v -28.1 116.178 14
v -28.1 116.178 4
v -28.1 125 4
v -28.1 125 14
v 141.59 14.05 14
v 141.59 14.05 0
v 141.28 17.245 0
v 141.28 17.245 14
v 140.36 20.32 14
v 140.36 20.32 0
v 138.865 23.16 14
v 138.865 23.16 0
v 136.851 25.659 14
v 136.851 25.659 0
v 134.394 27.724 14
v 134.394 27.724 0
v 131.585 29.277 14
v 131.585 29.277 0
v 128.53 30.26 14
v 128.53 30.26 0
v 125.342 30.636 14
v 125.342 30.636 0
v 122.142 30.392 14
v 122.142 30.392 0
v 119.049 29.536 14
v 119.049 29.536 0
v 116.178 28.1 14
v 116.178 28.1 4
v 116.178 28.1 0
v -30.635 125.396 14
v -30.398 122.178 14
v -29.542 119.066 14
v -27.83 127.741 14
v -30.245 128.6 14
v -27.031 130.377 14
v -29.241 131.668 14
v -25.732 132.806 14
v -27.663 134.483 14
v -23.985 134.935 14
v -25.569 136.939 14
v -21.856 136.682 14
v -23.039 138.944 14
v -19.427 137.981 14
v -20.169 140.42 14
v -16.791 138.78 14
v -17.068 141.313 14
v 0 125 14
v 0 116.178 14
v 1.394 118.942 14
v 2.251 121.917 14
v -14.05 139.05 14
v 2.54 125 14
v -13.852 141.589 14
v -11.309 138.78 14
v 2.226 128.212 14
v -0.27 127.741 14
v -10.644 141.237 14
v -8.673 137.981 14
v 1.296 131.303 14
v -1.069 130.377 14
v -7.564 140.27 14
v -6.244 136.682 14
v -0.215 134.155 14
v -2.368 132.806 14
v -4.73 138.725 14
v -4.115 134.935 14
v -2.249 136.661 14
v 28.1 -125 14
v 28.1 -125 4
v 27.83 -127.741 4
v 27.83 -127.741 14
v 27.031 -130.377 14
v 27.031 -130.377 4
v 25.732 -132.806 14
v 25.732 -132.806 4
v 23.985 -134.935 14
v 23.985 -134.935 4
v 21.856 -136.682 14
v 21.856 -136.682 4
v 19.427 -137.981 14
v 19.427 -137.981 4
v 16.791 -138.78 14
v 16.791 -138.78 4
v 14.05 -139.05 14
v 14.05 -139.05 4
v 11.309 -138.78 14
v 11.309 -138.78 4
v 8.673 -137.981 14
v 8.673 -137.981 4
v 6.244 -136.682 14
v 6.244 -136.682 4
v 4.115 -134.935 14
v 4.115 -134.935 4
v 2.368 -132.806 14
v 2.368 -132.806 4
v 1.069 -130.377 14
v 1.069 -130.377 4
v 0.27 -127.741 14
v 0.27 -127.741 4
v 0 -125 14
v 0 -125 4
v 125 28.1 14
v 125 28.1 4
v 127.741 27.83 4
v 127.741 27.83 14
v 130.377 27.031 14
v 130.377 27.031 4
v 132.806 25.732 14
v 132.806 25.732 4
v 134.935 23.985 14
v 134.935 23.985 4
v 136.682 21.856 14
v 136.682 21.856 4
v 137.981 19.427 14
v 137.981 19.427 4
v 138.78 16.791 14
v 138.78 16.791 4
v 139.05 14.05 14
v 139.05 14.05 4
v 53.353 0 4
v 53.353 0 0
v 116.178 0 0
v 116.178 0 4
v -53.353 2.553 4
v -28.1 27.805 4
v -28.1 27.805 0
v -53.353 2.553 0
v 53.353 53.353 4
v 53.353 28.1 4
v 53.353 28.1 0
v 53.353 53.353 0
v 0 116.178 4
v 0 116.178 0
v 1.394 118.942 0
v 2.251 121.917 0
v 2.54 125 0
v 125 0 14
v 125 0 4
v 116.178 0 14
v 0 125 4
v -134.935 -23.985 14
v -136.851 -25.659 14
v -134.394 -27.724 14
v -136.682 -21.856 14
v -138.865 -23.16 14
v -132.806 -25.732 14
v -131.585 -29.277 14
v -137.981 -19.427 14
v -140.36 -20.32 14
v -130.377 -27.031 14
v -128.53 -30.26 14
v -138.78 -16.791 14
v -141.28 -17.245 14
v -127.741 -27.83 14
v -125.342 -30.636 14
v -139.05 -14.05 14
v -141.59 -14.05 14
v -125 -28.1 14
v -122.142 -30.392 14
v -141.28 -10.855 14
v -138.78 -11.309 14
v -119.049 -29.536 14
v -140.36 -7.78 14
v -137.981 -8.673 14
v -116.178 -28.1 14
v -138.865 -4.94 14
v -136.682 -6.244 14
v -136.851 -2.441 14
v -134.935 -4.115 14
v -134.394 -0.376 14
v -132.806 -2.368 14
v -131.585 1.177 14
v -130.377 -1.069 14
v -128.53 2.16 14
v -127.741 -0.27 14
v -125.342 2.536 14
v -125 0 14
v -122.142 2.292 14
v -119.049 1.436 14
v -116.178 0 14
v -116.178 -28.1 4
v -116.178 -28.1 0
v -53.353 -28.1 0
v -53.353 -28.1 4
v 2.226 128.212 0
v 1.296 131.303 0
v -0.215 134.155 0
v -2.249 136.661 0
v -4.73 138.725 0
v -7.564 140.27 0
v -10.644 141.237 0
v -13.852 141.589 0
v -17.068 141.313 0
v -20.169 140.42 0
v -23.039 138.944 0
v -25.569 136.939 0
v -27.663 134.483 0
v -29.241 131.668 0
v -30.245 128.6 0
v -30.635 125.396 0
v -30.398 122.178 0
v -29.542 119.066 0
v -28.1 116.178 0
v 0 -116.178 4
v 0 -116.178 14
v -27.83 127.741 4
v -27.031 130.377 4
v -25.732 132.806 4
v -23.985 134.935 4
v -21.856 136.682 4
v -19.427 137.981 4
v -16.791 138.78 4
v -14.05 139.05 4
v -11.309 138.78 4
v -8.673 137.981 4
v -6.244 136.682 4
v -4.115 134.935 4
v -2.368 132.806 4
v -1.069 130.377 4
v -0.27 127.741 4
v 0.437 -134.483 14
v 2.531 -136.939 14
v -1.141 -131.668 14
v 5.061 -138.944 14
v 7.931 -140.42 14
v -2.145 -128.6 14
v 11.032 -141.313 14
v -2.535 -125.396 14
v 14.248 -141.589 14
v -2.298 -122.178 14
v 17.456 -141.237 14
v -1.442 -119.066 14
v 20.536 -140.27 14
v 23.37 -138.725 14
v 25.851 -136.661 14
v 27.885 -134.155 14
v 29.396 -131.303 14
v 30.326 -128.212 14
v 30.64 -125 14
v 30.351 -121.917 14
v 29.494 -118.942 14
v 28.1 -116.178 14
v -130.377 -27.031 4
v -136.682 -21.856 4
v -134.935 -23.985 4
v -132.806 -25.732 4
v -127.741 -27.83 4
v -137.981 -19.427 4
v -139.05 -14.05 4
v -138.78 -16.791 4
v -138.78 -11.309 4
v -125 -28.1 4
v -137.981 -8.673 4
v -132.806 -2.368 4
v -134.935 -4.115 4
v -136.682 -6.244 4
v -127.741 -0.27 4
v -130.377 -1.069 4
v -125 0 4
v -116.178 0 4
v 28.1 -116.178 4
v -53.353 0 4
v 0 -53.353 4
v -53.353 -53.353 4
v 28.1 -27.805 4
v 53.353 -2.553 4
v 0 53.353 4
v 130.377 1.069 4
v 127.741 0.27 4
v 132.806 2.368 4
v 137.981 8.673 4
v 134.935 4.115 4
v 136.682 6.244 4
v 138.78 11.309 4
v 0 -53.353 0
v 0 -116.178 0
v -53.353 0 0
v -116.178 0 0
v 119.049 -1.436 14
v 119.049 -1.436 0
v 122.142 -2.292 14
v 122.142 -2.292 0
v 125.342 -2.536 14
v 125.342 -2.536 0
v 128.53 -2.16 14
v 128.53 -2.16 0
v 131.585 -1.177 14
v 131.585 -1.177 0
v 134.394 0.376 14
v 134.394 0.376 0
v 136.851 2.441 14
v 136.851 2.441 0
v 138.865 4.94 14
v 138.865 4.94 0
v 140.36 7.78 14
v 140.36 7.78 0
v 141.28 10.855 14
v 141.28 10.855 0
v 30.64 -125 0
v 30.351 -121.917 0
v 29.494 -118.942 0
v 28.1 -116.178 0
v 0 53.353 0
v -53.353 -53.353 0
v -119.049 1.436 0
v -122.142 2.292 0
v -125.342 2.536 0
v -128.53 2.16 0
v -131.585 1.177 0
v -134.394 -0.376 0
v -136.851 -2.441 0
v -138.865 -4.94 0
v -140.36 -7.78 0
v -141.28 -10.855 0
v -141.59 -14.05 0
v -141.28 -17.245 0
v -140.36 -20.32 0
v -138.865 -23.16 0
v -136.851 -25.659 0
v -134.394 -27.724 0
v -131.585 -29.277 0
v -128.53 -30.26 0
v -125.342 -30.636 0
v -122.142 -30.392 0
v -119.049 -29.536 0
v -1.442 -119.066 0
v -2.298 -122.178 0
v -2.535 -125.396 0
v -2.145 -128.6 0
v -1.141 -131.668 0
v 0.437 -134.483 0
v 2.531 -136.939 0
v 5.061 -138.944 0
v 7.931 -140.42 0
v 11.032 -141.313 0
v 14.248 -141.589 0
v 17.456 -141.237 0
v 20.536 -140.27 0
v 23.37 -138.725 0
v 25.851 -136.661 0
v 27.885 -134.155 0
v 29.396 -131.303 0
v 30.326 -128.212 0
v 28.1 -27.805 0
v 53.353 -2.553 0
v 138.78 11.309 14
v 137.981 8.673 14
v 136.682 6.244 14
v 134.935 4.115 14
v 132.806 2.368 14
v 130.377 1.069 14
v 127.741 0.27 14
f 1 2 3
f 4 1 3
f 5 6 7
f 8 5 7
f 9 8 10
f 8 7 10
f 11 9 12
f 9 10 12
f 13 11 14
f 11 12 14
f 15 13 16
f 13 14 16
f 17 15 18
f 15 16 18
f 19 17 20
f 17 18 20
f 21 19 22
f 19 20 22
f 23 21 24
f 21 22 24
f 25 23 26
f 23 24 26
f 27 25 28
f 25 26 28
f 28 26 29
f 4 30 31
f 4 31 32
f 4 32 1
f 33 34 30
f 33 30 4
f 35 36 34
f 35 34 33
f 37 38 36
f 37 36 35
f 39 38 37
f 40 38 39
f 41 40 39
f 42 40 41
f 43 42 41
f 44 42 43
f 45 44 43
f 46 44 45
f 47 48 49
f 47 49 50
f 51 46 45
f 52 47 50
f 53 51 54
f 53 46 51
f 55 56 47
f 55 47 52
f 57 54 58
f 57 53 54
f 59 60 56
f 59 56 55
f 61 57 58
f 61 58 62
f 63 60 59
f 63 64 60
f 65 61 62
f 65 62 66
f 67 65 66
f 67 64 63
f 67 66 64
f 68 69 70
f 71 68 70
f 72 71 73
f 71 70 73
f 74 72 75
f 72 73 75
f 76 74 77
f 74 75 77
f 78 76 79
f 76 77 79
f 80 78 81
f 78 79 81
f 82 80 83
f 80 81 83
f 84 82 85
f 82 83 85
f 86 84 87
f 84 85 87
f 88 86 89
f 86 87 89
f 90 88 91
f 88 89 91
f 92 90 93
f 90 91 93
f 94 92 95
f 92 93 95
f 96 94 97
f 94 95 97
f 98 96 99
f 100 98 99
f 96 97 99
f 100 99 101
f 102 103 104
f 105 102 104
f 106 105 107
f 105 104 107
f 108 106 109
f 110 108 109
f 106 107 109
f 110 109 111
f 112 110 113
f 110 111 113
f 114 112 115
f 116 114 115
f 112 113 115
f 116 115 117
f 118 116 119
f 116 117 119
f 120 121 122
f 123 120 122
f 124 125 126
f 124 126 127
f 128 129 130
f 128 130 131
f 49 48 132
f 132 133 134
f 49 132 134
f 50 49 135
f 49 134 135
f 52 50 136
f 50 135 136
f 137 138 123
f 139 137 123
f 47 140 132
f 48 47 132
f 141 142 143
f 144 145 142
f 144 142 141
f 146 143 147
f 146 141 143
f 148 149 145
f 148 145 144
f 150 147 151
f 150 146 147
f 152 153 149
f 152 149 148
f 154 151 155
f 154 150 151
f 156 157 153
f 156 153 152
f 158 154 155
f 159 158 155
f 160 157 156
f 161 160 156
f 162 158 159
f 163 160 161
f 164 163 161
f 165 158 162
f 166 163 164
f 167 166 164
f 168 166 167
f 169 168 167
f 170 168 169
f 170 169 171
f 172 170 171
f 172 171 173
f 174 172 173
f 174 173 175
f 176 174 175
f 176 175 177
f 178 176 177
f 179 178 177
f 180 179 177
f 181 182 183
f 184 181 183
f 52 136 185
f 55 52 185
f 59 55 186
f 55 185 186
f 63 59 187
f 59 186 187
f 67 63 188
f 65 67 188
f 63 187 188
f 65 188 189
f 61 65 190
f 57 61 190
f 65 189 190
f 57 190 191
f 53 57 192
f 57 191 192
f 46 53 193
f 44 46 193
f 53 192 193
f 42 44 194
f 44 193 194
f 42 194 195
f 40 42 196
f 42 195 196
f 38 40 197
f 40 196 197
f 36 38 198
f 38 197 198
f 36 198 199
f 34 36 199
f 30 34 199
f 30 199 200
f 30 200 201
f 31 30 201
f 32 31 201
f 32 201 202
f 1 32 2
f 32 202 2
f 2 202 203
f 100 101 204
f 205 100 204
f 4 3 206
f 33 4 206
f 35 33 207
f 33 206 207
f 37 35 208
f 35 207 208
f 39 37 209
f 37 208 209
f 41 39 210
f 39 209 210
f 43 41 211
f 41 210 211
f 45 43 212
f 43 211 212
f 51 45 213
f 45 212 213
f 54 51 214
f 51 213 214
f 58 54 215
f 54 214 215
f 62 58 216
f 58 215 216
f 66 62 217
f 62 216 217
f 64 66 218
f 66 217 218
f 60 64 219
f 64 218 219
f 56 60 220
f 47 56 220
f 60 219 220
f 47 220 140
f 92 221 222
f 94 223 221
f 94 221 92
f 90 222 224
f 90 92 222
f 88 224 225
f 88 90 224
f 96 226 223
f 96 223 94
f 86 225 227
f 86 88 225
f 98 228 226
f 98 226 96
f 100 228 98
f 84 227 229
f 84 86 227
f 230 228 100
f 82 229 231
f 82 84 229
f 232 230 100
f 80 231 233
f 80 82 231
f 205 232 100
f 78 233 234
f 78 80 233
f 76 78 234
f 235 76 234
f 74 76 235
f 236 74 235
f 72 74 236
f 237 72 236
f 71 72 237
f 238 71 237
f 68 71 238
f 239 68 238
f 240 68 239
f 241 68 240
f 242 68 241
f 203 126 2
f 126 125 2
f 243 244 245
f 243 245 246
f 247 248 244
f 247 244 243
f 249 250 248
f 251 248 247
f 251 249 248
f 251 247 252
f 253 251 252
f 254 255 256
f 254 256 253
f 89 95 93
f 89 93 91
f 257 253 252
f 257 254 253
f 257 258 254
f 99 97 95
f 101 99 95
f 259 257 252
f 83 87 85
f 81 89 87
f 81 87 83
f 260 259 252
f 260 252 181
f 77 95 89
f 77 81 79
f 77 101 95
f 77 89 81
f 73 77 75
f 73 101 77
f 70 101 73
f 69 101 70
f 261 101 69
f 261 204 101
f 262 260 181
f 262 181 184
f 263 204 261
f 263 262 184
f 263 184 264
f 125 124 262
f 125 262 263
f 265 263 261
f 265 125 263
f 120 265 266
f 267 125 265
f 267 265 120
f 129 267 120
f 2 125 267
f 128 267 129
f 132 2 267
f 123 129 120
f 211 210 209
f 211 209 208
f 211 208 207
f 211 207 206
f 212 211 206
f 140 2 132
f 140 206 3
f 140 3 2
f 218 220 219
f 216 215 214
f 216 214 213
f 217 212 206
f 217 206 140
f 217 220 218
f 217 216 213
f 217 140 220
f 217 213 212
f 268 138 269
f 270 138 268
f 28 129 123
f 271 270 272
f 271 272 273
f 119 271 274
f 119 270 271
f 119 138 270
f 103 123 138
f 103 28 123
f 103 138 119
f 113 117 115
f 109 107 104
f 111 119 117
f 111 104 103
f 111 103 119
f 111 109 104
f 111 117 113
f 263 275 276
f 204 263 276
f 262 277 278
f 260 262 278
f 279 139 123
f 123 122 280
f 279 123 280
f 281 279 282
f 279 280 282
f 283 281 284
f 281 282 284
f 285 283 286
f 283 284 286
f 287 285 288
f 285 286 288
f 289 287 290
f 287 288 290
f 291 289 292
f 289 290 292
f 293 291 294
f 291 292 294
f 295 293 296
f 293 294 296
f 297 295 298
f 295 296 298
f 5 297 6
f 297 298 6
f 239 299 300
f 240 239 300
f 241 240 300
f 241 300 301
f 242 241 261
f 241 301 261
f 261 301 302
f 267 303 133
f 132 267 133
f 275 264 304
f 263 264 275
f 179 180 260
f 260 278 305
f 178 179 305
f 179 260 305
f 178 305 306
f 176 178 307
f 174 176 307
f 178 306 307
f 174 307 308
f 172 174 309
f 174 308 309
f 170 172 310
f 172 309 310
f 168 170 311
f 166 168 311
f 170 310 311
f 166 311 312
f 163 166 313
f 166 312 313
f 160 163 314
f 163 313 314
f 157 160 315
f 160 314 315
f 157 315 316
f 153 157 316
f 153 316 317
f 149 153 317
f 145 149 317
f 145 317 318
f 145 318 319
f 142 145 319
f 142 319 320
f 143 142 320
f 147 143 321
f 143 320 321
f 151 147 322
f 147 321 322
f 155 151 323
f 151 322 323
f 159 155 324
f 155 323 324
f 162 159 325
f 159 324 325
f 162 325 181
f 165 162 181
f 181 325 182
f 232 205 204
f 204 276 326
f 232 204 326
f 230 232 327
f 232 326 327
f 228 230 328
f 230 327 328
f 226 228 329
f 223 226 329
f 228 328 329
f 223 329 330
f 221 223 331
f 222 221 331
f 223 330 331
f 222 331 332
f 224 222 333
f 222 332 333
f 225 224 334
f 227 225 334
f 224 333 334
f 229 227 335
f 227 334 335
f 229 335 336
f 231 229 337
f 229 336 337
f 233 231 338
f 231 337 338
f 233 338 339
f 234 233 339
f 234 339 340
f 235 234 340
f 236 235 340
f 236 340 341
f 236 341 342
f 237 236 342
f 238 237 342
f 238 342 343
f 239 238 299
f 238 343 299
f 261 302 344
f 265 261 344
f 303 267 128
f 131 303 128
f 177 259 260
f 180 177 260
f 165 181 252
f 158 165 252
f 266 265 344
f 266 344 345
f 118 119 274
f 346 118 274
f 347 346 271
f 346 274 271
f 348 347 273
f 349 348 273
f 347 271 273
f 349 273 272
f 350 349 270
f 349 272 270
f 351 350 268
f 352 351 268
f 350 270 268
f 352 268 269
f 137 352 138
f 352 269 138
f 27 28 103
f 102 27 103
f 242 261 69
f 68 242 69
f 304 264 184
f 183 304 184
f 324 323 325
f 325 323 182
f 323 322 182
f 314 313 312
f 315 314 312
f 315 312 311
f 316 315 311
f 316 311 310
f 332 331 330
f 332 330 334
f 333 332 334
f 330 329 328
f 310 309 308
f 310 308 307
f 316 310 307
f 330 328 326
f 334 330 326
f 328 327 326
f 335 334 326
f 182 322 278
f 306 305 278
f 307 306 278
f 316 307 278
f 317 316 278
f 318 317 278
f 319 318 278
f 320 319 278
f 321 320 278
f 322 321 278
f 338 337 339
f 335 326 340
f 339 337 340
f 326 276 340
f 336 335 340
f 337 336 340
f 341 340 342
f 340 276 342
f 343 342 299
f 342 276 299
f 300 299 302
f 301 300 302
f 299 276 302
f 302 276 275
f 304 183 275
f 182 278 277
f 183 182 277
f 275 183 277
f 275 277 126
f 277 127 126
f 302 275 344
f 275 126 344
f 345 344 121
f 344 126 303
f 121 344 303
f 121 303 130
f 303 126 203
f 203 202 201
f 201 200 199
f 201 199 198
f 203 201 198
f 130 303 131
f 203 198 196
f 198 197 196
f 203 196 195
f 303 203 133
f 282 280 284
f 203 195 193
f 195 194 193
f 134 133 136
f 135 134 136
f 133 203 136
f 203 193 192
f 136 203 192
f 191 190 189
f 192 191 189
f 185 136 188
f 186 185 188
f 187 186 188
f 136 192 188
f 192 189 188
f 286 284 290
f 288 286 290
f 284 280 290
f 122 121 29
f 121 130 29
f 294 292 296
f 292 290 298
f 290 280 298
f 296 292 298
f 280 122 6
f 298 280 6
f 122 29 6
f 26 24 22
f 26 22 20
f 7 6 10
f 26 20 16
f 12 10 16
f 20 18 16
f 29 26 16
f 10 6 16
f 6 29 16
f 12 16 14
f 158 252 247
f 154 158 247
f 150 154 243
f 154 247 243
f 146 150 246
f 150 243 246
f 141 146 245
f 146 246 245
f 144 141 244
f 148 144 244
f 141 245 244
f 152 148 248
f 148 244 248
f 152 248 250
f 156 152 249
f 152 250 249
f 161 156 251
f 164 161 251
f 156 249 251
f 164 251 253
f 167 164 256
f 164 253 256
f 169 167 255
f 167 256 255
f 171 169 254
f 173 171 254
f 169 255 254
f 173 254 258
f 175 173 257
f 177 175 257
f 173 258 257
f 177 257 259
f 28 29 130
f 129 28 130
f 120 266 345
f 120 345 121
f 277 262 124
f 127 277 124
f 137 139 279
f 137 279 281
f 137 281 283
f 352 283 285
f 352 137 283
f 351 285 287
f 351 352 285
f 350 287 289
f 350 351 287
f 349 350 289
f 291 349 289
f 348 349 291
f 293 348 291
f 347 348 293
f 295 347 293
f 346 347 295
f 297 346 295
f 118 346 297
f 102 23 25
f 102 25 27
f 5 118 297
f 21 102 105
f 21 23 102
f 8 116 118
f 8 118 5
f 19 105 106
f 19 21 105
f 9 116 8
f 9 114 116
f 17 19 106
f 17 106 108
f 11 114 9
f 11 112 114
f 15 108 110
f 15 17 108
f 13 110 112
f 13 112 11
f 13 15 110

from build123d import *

# Parameters (mm, degrees)
F1_DEPTH    = 4
F2_DEPTH    = 14
F3_W        = 53.352586925
F3_H        = 25.252586925
F4_DEPTH    = 4
F3_W_2      = 25.252586925
F3_H_2      = 53.352586925
F5_DEPTH    = 4
F6_T4_DEPTH = 265.2829915773
F6_T9_DEPTH = 265.2829915773


# Not quite as in the source:
# - a fillet or chamfer that OpenCascade refuses, or shapes differently, is made with other operations: its cross-section is extruded or revolved along the edge and cut away or added


with BuildPart() as f1:
    # F0 (on Top) → F1 (new body)
    with BuildSketch(Plane.XY):
        with BuildLine():
            ThreePointArc((0, 125), (-14.05, 139.05), (-28.1, 125))
            Line((-28.1, 125), (0, 125))
        make_face()
        with BuildLine():
            Line((0, 125), (-28.1, 125))
            ThreePointArc((-28.1, 125), (-14.05, 110.95), (0, 125))
        make_face()
        with BuildLine():
            Line((-28.1, 125), (-28.1, 116.1781181146))
            ThreePointArc((-28.1, 116.1781181146), (-14.05, 108.41), (0, 116.1781181146))
            Line((0, 116.1781181146), (0, 125))
            ThreePointArc((0, 125), (-14.05, 110.95), (-28.1, 125))
        make_face()
        with BuildLine():
            Line((-28.1, 0), (0, 0))
            Line((0, 0), (0, 28.1))
            Line((0, 28.1), (0, 116.1781181146))
            ThreePointArc((0, 116.1781181146), (-14.05, 108.41), (-28.1, 116.1781181146))
            Line((-28.1, 116.1781181146), (-28.1, 0))
        make_face()
        with BuildLine():
            Line((0, 28.1), (0, 0))
            Line((0, 0), (28.1, 0))
            Line((28.1, 0), (116.1781181146, 0))
            ThreePointArc((116.1781181146, 0), (108.41, 14.05), (116.1781181146, 28.1))
            Line((116.1781181146, 28.1), (0, 28.1))
        make_face()
        with BuildLine():
            ThreePointArc((139.05, 14.05), (134.9348502757, 23.9848502757), (125, 28.1))
            Line((125, 28.1), (125, 0))
            ThreePointArc((125, 0), (134.9348502757, 4.1151497243), (139.05, 14.05))
        make_face()
        with BuildLine():
            Line((125, 0), (125, 28.1))
            ThreePointArc((125, 28.1), (110.95, 14.05), (125, 0))
        make_face()
        with BuildLine():
            Line((28.1, 0), (0, 0))
            Line((0, 0), (0, -28.1))
            Line((0, -28.1), (0, -116.1781181146))
            ThreePointArc((0, -116.1781181146), (14.05, -108.41), (28.1, -116.1781181146))
            Line((28.1, -116.1781181146), (28.1, 0))
        make_face()
        with BuildLine():
            Line((28.1, -125), (0, -125))
            ThreePointArc((0, -125), (14.05, -139.05), (28.1, -125))
        make_face()
        with BuildLine():
            ThreePointArc((28.1, -125), (14.05, -110.95), (0, -125))
            Line((0, -125), (28.1, -125))
        make_face()
        with BuildLine():
            ThreePointArc((28.1, -116.1781181146), (14.05, -108.41), (0, -116.1781181146))
            Line((0, -116.1781181146), (0, -125))
            ThreePointArc((0, -125), (14.05, -110.95), (28.1, -125))
            Line((28.1, -125), (28.1, -116.1781181146))
        make_face()
        with BuildLine():
            Line((-125, -28.1), (-125, 0))
            ThreePointArc((-125, 0), (-139.05, -14.05), (-125, -28.1))
        make_face()
        with BuildLine():
            ThreePointArc((-110.95, -14.05), (-115.0651497243, -4.1151497243), (-125, 0))
            Line((-125, 0), (-125, -28.1))
            ThreePointArc((-125, -28.1), (-115.0651497243, -23.9848502757), (-110.95, -14.05))
        make_face()
        with BuildLine():
            ThreePointArc((-108.41, -14.05), (-110.4813375189, -6.0227626321), (-116.1781181146, 0))
            Line((-116.1781181146, 0), (-125, 0))
            ThreePointArc((-125, 0), (-115.0651497243, -4.1151497243), (-110.95, -14.05))
            ThreePointArc((-110.95, -14.05), (-115.0651497243, -23.9848502757), (-125, -28.1))
            Line((-125, -28.1), (-116.1781181146, -28.1))
            ThreePointArc((-116.1781181146, -28.1), (-110.4813375189, -22.0772373679), (-108.41, -14.05))
        make_face()
        with BuildLine():
            Line((0, -28.1), (0, 0))
            Line((0, 0), (-28.1, 0))
            Line((-28.1, 0), (-116.1781181146, 0))
            ThreePointArc((-116.1781181146, 0), (-110.4813375189, -6.0227626321), (-108.41, -14.05))
            ThreePointArc((-108.41, -14.05), (-110.4813375189, -22.0772373679), (-116.1781181146, -28.1))
            Line((-116.1781181146, -28.1), (0, -28.1))
        make_face()
        with BuildLine():
            Line((125, 28.1), (116.1781181146, 28.1))
            ThreePointArc((116.1781181146, 28.1), (108.41, 14.05), (116.1781181146, 0))
            Line((116.1781181146, 0), (125, 0))
            ThreePointArc((125, 0), (110.95, 14.05), (125, 28.1))
        make_face()
    extrude(amount=F1_DEPTH)

    # F0 (on Top) → F2 (join)
    with BuildSketch(Plane.XY):
        with BuildLine():
            ThreePointArc((2.54, 125), (-18.6401307171, 140.9423586712), (-28.1, 116.1781181146))
            Line((-28.1, 116.1781181146), (-28.1, 125))
            ThreePointArc((-28.1, 125), (-14.05, 139.05), (0, 125))
            Line((0, 125), (0, 116.1781181146))
            ThreePointArc((0, 116.1781181146), (1.8923586712, 120.4098692829), (2.54, 125))
        make_face()
        with BuildLine():
            ThreePointArc((141.59, 14.05), (133.0272373679, 28.5686624811), (116.1781181146, 28.1))
            Line((116.1781181146, 28.1), (125, 28.1))
            ThreePointArc((125, 28.1), (134.9348502757, 23.9848502757), (139.05, 14.05))
            ThreePointArc((139.05, 14.05), (134.9348502757, 4.1151497243), (125, 0))
            Line((125, 0), (116.1781181146, 0))
            ThreePointArc((116.1781181146, 0), (133.0272373679, -0.4686624811), (141.59, 14.05))
        make_face()
        with BuildLine():
            Line((0, -125), (0, -116.1781181146))
            ThreePointArc((0, -116.1781181146), (9.4598692829, -140.9423586712), (30.64, -125))
            ThreePointArc((30.64, -125), (29.9923586712, -120.4098692829), (28.1, -116.1781181146))
            Line((28.1, -116.1781181146), (28.1, -125))
            ThreePointArc((28.1, -125), (14.05, -139.05), (0, -125))
        make_face()
        with BuildLine():
            Line((-125, 0), (-116.1781181146, 0))
            ThreePointArc((-116.1781181146, 0), (-141.59, -14.05), (-116.1781181146, -28.1))
            Line((-116.1781181146, -28.1), (-125, -28.1))
            ThreePointArc((-125, -28.1), (-139.05, -14.05), (-125, 0))
        make_face()
    extrude(amount=F2_DEPTH)

    # F3 (on face) → F4 (join)
    with BuildSketch(Plane.XY.offset(4)):
        with Locations((26.6762934625, 40.7262934625)):
            Rectangle(F3_W, F3_H)
    extrude(amount=-F4_DEPTH)

    # F3 (on face) → F5 (join)
    with BuildSketch(Plane.XY.offset(4)):
        with Locations((40.7262934625, -26.6762934625)):
            Rectangle(F3_W_2, F3_H_2)
        with Locations((-26.6762934625, -40.7262934625)):
            Rectangle(F3_W, F3_H)
        with Locations((-40.7262934625, 26.6762934625)):
            Rectangle(F3_W_2, F3_H_2)
    extrude(amount=-F5_DEPTH)

    # F6: chamfer of 50.8 on 2 edges, made by hand


with BuildPart() as f6_tool2:
    # F6_s3 → F6_t4 (new body)
    with BuildSketch(Plane.XY.offset(134.6414957887)):
        Polygon((2.552586925, -53.352586925), (53.352586925, -2.552586925), (53.352586925, -53.352586925), align=None)
    extrude(amount=-F6_T4_DEPTH)

    split(bisect_by=Plane.YZ.offset(28.1), keep=Keep.TOP)


with BuildPart() as f1_1:
    add(f1.part)

    # F6_t1: cut F6_tool2
    add(f6_tool2.part, mode=Mode.SUBTRACT)


with BuildPart() as f6_tool7:
    # F6_s8 → F6_t9 (new body)
    with BuildSketch(Plane.XY.offset(134.6414957887)):
        Polygon((-2.552586925, 53.352586925), (-53.352586925, 2.552586925), (-53.352586925, 53.352586925), align=None)
    extrude(amount=-F6_T9_DEPTH)

    split(bisect_by=Plane.YZ.offset(-28.1), keep=Keep.BOTTOM)


with BuildPart() as f1_2:
    add(f1_1.part)

    # F6_t6: cut F6_tool7
    add(f6_tool7.part, mode=Mode.SUBTRACT)


solid = f1_2.part
